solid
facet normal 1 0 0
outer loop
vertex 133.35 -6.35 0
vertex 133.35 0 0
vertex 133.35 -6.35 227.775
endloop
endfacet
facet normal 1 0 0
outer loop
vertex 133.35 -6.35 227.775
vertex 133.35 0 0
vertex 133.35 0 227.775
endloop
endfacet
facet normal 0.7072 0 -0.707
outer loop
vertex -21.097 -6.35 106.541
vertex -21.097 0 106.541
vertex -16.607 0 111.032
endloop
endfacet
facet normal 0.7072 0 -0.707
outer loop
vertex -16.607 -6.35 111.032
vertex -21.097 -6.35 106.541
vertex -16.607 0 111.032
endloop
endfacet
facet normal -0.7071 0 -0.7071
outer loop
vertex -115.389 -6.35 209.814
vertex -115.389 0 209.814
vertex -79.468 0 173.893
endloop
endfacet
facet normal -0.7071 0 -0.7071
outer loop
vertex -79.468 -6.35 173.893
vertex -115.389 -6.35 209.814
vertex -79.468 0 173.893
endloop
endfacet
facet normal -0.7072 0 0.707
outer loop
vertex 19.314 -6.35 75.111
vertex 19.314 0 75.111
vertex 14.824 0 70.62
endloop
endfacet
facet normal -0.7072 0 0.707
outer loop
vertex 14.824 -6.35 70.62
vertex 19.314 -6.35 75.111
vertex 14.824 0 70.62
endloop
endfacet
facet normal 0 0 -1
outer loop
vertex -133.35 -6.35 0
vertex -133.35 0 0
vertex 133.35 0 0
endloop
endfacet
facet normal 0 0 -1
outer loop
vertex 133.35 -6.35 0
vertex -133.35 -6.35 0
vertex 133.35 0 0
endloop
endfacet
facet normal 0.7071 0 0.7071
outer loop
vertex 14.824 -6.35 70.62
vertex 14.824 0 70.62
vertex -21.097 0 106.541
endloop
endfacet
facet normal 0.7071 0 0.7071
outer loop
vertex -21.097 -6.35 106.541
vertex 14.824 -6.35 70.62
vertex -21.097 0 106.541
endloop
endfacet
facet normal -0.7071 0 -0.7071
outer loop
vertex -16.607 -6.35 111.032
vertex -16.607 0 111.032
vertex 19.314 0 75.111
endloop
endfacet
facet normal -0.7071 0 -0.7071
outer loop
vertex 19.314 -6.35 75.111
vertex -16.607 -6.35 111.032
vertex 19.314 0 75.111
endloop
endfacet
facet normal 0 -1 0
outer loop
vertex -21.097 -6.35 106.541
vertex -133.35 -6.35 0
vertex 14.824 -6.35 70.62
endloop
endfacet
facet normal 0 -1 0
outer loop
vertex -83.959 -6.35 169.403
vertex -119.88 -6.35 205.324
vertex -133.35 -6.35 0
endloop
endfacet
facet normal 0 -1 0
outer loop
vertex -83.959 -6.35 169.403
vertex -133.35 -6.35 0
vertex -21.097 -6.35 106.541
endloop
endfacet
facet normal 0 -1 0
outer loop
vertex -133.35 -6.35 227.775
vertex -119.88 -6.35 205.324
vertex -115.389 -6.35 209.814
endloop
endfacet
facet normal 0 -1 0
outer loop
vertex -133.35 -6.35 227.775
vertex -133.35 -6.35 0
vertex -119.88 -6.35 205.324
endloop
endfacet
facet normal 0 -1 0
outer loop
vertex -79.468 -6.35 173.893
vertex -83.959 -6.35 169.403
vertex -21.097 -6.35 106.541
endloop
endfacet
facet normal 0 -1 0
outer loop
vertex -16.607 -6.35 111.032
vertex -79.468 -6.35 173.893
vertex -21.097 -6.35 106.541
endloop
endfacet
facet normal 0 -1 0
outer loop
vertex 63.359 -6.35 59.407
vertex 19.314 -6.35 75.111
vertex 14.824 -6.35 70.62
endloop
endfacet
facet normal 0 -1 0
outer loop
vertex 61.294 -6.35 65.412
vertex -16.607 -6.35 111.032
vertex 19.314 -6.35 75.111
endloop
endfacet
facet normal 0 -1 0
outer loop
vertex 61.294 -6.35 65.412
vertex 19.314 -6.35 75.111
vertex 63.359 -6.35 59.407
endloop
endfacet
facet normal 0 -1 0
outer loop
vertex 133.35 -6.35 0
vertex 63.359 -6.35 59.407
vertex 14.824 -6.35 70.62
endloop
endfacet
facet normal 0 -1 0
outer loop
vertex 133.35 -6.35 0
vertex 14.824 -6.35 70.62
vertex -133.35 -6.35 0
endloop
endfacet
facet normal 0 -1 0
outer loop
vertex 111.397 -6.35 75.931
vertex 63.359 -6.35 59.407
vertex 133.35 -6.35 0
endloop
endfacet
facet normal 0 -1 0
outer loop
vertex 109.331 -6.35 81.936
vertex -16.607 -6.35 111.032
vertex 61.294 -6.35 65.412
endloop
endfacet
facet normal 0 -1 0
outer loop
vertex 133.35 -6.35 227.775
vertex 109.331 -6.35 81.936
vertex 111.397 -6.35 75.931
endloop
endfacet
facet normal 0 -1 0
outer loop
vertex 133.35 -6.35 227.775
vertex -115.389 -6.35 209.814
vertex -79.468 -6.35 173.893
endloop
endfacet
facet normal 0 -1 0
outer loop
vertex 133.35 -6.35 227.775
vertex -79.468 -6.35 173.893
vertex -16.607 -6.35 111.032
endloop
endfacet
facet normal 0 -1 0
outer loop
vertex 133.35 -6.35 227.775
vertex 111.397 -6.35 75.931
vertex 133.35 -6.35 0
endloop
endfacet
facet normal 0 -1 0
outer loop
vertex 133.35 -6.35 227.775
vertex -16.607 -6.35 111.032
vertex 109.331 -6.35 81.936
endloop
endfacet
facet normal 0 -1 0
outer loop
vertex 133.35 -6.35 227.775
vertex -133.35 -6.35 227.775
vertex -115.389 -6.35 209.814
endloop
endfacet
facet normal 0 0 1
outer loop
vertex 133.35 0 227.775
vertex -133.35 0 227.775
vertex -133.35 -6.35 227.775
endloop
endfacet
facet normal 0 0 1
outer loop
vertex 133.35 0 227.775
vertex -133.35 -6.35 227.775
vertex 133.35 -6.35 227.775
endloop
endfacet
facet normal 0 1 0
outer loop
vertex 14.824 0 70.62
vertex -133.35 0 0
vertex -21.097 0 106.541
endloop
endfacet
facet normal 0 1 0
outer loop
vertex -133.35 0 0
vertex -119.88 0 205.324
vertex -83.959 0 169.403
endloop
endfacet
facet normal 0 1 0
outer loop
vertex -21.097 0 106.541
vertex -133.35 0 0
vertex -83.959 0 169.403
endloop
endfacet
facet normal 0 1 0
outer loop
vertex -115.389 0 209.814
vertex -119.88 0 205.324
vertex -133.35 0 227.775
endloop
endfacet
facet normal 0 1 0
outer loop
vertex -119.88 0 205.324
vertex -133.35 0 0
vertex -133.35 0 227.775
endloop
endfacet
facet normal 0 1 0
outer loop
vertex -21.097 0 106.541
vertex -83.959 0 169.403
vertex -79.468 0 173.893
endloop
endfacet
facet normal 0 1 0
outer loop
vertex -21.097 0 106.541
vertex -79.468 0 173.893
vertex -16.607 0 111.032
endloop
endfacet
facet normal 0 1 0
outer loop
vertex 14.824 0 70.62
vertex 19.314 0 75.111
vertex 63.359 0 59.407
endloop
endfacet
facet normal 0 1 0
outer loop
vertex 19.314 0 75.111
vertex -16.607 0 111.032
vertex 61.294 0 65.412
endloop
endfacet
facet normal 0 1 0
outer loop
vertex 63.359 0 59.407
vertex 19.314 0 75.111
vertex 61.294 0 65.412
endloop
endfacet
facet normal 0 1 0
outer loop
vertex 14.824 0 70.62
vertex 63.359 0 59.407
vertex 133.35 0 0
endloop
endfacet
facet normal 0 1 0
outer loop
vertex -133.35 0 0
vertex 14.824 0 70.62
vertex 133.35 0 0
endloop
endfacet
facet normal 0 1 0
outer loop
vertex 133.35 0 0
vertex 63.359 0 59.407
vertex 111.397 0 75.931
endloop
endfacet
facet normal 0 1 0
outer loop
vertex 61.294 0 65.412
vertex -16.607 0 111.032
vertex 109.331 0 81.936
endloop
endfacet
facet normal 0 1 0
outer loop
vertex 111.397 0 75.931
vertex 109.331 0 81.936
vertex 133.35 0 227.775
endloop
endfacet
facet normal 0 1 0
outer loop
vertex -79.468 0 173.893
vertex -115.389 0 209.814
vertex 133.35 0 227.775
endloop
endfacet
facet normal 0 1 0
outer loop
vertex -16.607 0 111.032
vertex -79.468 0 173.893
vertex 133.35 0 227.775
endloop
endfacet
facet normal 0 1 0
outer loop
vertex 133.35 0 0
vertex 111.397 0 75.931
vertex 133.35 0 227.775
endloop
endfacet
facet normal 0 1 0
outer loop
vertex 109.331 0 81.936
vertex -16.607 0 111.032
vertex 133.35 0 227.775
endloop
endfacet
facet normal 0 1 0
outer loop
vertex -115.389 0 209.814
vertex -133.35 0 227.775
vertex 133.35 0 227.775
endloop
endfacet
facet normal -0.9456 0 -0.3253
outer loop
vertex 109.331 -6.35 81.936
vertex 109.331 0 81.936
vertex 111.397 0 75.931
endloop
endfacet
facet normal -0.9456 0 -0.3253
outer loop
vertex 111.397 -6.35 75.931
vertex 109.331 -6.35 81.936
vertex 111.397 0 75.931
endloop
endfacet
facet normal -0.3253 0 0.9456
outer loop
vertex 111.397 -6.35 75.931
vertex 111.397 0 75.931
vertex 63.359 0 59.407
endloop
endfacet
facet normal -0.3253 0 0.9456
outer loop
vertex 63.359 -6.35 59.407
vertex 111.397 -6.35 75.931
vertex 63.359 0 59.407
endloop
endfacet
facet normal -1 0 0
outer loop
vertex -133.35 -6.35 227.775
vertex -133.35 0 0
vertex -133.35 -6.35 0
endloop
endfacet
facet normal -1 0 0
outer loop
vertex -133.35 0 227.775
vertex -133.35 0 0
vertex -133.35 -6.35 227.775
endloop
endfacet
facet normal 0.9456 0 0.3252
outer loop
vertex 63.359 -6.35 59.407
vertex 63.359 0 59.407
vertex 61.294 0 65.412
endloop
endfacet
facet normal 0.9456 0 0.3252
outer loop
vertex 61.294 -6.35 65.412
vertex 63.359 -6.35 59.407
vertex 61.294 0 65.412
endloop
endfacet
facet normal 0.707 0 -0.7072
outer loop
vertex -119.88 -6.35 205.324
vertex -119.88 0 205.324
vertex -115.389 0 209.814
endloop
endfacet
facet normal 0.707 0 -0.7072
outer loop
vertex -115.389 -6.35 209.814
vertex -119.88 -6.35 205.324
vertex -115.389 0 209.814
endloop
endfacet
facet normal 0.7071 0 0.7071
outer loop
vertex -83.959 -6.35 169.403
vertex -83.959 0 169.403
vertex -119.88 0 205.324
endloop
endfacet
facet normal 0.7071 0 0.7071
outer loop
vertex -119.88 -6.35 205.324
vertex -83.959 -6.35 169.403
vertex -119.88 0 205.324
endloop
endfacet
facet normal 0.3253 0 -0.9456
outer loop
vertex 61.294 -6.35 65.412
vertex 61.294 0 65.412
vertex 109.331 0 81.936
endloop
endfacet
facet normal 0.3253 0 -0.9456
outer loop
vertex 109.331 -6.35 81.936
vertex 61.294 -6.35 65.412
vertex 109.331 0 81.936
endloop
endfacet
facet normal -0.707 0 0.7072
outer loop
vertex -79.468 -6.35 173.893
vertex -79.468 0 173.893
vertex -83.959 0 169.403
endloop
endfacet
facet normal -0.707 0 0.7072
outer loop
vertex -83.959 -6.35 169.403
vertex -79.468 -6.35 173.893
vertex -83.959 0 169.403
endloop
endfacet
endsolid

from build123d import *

# Parameters (mm, degrees)
F0_W     = 266.7
F0_H     = 227.774866
F1_DEPTH = 6.35


with BuildPart() as f1:
    # F0 (on Front) → F1 (new body)
    with BuildSketch(Plane.XZ):
        with Locations((0, 113.887433)):
            Rectangle(F0_W, F0_H)
        Polygon((-16.60667, 111.031537), (19.314354, 75.110512), (14.824226, 70.620384), (-21.096798, 106.541409), align=None, mode=Mode.SUBTRACT)
        Polygon((63.35911, 59.407147), (61.29365, 65.411843), (109.331217, 81.935528), (111.396677, 75.930832), align=None, mode=Mode.SUBTRACT)
        Polygon((-119.879616, 205.324226), (-115.389488, 209.814354), (-79.468463, 173.89333), (-83.958591, 169.403202), align=None, mode=Mode.SUBTRACT)
    extrude(amount=F1_DEPTH)


solid = f1.part
